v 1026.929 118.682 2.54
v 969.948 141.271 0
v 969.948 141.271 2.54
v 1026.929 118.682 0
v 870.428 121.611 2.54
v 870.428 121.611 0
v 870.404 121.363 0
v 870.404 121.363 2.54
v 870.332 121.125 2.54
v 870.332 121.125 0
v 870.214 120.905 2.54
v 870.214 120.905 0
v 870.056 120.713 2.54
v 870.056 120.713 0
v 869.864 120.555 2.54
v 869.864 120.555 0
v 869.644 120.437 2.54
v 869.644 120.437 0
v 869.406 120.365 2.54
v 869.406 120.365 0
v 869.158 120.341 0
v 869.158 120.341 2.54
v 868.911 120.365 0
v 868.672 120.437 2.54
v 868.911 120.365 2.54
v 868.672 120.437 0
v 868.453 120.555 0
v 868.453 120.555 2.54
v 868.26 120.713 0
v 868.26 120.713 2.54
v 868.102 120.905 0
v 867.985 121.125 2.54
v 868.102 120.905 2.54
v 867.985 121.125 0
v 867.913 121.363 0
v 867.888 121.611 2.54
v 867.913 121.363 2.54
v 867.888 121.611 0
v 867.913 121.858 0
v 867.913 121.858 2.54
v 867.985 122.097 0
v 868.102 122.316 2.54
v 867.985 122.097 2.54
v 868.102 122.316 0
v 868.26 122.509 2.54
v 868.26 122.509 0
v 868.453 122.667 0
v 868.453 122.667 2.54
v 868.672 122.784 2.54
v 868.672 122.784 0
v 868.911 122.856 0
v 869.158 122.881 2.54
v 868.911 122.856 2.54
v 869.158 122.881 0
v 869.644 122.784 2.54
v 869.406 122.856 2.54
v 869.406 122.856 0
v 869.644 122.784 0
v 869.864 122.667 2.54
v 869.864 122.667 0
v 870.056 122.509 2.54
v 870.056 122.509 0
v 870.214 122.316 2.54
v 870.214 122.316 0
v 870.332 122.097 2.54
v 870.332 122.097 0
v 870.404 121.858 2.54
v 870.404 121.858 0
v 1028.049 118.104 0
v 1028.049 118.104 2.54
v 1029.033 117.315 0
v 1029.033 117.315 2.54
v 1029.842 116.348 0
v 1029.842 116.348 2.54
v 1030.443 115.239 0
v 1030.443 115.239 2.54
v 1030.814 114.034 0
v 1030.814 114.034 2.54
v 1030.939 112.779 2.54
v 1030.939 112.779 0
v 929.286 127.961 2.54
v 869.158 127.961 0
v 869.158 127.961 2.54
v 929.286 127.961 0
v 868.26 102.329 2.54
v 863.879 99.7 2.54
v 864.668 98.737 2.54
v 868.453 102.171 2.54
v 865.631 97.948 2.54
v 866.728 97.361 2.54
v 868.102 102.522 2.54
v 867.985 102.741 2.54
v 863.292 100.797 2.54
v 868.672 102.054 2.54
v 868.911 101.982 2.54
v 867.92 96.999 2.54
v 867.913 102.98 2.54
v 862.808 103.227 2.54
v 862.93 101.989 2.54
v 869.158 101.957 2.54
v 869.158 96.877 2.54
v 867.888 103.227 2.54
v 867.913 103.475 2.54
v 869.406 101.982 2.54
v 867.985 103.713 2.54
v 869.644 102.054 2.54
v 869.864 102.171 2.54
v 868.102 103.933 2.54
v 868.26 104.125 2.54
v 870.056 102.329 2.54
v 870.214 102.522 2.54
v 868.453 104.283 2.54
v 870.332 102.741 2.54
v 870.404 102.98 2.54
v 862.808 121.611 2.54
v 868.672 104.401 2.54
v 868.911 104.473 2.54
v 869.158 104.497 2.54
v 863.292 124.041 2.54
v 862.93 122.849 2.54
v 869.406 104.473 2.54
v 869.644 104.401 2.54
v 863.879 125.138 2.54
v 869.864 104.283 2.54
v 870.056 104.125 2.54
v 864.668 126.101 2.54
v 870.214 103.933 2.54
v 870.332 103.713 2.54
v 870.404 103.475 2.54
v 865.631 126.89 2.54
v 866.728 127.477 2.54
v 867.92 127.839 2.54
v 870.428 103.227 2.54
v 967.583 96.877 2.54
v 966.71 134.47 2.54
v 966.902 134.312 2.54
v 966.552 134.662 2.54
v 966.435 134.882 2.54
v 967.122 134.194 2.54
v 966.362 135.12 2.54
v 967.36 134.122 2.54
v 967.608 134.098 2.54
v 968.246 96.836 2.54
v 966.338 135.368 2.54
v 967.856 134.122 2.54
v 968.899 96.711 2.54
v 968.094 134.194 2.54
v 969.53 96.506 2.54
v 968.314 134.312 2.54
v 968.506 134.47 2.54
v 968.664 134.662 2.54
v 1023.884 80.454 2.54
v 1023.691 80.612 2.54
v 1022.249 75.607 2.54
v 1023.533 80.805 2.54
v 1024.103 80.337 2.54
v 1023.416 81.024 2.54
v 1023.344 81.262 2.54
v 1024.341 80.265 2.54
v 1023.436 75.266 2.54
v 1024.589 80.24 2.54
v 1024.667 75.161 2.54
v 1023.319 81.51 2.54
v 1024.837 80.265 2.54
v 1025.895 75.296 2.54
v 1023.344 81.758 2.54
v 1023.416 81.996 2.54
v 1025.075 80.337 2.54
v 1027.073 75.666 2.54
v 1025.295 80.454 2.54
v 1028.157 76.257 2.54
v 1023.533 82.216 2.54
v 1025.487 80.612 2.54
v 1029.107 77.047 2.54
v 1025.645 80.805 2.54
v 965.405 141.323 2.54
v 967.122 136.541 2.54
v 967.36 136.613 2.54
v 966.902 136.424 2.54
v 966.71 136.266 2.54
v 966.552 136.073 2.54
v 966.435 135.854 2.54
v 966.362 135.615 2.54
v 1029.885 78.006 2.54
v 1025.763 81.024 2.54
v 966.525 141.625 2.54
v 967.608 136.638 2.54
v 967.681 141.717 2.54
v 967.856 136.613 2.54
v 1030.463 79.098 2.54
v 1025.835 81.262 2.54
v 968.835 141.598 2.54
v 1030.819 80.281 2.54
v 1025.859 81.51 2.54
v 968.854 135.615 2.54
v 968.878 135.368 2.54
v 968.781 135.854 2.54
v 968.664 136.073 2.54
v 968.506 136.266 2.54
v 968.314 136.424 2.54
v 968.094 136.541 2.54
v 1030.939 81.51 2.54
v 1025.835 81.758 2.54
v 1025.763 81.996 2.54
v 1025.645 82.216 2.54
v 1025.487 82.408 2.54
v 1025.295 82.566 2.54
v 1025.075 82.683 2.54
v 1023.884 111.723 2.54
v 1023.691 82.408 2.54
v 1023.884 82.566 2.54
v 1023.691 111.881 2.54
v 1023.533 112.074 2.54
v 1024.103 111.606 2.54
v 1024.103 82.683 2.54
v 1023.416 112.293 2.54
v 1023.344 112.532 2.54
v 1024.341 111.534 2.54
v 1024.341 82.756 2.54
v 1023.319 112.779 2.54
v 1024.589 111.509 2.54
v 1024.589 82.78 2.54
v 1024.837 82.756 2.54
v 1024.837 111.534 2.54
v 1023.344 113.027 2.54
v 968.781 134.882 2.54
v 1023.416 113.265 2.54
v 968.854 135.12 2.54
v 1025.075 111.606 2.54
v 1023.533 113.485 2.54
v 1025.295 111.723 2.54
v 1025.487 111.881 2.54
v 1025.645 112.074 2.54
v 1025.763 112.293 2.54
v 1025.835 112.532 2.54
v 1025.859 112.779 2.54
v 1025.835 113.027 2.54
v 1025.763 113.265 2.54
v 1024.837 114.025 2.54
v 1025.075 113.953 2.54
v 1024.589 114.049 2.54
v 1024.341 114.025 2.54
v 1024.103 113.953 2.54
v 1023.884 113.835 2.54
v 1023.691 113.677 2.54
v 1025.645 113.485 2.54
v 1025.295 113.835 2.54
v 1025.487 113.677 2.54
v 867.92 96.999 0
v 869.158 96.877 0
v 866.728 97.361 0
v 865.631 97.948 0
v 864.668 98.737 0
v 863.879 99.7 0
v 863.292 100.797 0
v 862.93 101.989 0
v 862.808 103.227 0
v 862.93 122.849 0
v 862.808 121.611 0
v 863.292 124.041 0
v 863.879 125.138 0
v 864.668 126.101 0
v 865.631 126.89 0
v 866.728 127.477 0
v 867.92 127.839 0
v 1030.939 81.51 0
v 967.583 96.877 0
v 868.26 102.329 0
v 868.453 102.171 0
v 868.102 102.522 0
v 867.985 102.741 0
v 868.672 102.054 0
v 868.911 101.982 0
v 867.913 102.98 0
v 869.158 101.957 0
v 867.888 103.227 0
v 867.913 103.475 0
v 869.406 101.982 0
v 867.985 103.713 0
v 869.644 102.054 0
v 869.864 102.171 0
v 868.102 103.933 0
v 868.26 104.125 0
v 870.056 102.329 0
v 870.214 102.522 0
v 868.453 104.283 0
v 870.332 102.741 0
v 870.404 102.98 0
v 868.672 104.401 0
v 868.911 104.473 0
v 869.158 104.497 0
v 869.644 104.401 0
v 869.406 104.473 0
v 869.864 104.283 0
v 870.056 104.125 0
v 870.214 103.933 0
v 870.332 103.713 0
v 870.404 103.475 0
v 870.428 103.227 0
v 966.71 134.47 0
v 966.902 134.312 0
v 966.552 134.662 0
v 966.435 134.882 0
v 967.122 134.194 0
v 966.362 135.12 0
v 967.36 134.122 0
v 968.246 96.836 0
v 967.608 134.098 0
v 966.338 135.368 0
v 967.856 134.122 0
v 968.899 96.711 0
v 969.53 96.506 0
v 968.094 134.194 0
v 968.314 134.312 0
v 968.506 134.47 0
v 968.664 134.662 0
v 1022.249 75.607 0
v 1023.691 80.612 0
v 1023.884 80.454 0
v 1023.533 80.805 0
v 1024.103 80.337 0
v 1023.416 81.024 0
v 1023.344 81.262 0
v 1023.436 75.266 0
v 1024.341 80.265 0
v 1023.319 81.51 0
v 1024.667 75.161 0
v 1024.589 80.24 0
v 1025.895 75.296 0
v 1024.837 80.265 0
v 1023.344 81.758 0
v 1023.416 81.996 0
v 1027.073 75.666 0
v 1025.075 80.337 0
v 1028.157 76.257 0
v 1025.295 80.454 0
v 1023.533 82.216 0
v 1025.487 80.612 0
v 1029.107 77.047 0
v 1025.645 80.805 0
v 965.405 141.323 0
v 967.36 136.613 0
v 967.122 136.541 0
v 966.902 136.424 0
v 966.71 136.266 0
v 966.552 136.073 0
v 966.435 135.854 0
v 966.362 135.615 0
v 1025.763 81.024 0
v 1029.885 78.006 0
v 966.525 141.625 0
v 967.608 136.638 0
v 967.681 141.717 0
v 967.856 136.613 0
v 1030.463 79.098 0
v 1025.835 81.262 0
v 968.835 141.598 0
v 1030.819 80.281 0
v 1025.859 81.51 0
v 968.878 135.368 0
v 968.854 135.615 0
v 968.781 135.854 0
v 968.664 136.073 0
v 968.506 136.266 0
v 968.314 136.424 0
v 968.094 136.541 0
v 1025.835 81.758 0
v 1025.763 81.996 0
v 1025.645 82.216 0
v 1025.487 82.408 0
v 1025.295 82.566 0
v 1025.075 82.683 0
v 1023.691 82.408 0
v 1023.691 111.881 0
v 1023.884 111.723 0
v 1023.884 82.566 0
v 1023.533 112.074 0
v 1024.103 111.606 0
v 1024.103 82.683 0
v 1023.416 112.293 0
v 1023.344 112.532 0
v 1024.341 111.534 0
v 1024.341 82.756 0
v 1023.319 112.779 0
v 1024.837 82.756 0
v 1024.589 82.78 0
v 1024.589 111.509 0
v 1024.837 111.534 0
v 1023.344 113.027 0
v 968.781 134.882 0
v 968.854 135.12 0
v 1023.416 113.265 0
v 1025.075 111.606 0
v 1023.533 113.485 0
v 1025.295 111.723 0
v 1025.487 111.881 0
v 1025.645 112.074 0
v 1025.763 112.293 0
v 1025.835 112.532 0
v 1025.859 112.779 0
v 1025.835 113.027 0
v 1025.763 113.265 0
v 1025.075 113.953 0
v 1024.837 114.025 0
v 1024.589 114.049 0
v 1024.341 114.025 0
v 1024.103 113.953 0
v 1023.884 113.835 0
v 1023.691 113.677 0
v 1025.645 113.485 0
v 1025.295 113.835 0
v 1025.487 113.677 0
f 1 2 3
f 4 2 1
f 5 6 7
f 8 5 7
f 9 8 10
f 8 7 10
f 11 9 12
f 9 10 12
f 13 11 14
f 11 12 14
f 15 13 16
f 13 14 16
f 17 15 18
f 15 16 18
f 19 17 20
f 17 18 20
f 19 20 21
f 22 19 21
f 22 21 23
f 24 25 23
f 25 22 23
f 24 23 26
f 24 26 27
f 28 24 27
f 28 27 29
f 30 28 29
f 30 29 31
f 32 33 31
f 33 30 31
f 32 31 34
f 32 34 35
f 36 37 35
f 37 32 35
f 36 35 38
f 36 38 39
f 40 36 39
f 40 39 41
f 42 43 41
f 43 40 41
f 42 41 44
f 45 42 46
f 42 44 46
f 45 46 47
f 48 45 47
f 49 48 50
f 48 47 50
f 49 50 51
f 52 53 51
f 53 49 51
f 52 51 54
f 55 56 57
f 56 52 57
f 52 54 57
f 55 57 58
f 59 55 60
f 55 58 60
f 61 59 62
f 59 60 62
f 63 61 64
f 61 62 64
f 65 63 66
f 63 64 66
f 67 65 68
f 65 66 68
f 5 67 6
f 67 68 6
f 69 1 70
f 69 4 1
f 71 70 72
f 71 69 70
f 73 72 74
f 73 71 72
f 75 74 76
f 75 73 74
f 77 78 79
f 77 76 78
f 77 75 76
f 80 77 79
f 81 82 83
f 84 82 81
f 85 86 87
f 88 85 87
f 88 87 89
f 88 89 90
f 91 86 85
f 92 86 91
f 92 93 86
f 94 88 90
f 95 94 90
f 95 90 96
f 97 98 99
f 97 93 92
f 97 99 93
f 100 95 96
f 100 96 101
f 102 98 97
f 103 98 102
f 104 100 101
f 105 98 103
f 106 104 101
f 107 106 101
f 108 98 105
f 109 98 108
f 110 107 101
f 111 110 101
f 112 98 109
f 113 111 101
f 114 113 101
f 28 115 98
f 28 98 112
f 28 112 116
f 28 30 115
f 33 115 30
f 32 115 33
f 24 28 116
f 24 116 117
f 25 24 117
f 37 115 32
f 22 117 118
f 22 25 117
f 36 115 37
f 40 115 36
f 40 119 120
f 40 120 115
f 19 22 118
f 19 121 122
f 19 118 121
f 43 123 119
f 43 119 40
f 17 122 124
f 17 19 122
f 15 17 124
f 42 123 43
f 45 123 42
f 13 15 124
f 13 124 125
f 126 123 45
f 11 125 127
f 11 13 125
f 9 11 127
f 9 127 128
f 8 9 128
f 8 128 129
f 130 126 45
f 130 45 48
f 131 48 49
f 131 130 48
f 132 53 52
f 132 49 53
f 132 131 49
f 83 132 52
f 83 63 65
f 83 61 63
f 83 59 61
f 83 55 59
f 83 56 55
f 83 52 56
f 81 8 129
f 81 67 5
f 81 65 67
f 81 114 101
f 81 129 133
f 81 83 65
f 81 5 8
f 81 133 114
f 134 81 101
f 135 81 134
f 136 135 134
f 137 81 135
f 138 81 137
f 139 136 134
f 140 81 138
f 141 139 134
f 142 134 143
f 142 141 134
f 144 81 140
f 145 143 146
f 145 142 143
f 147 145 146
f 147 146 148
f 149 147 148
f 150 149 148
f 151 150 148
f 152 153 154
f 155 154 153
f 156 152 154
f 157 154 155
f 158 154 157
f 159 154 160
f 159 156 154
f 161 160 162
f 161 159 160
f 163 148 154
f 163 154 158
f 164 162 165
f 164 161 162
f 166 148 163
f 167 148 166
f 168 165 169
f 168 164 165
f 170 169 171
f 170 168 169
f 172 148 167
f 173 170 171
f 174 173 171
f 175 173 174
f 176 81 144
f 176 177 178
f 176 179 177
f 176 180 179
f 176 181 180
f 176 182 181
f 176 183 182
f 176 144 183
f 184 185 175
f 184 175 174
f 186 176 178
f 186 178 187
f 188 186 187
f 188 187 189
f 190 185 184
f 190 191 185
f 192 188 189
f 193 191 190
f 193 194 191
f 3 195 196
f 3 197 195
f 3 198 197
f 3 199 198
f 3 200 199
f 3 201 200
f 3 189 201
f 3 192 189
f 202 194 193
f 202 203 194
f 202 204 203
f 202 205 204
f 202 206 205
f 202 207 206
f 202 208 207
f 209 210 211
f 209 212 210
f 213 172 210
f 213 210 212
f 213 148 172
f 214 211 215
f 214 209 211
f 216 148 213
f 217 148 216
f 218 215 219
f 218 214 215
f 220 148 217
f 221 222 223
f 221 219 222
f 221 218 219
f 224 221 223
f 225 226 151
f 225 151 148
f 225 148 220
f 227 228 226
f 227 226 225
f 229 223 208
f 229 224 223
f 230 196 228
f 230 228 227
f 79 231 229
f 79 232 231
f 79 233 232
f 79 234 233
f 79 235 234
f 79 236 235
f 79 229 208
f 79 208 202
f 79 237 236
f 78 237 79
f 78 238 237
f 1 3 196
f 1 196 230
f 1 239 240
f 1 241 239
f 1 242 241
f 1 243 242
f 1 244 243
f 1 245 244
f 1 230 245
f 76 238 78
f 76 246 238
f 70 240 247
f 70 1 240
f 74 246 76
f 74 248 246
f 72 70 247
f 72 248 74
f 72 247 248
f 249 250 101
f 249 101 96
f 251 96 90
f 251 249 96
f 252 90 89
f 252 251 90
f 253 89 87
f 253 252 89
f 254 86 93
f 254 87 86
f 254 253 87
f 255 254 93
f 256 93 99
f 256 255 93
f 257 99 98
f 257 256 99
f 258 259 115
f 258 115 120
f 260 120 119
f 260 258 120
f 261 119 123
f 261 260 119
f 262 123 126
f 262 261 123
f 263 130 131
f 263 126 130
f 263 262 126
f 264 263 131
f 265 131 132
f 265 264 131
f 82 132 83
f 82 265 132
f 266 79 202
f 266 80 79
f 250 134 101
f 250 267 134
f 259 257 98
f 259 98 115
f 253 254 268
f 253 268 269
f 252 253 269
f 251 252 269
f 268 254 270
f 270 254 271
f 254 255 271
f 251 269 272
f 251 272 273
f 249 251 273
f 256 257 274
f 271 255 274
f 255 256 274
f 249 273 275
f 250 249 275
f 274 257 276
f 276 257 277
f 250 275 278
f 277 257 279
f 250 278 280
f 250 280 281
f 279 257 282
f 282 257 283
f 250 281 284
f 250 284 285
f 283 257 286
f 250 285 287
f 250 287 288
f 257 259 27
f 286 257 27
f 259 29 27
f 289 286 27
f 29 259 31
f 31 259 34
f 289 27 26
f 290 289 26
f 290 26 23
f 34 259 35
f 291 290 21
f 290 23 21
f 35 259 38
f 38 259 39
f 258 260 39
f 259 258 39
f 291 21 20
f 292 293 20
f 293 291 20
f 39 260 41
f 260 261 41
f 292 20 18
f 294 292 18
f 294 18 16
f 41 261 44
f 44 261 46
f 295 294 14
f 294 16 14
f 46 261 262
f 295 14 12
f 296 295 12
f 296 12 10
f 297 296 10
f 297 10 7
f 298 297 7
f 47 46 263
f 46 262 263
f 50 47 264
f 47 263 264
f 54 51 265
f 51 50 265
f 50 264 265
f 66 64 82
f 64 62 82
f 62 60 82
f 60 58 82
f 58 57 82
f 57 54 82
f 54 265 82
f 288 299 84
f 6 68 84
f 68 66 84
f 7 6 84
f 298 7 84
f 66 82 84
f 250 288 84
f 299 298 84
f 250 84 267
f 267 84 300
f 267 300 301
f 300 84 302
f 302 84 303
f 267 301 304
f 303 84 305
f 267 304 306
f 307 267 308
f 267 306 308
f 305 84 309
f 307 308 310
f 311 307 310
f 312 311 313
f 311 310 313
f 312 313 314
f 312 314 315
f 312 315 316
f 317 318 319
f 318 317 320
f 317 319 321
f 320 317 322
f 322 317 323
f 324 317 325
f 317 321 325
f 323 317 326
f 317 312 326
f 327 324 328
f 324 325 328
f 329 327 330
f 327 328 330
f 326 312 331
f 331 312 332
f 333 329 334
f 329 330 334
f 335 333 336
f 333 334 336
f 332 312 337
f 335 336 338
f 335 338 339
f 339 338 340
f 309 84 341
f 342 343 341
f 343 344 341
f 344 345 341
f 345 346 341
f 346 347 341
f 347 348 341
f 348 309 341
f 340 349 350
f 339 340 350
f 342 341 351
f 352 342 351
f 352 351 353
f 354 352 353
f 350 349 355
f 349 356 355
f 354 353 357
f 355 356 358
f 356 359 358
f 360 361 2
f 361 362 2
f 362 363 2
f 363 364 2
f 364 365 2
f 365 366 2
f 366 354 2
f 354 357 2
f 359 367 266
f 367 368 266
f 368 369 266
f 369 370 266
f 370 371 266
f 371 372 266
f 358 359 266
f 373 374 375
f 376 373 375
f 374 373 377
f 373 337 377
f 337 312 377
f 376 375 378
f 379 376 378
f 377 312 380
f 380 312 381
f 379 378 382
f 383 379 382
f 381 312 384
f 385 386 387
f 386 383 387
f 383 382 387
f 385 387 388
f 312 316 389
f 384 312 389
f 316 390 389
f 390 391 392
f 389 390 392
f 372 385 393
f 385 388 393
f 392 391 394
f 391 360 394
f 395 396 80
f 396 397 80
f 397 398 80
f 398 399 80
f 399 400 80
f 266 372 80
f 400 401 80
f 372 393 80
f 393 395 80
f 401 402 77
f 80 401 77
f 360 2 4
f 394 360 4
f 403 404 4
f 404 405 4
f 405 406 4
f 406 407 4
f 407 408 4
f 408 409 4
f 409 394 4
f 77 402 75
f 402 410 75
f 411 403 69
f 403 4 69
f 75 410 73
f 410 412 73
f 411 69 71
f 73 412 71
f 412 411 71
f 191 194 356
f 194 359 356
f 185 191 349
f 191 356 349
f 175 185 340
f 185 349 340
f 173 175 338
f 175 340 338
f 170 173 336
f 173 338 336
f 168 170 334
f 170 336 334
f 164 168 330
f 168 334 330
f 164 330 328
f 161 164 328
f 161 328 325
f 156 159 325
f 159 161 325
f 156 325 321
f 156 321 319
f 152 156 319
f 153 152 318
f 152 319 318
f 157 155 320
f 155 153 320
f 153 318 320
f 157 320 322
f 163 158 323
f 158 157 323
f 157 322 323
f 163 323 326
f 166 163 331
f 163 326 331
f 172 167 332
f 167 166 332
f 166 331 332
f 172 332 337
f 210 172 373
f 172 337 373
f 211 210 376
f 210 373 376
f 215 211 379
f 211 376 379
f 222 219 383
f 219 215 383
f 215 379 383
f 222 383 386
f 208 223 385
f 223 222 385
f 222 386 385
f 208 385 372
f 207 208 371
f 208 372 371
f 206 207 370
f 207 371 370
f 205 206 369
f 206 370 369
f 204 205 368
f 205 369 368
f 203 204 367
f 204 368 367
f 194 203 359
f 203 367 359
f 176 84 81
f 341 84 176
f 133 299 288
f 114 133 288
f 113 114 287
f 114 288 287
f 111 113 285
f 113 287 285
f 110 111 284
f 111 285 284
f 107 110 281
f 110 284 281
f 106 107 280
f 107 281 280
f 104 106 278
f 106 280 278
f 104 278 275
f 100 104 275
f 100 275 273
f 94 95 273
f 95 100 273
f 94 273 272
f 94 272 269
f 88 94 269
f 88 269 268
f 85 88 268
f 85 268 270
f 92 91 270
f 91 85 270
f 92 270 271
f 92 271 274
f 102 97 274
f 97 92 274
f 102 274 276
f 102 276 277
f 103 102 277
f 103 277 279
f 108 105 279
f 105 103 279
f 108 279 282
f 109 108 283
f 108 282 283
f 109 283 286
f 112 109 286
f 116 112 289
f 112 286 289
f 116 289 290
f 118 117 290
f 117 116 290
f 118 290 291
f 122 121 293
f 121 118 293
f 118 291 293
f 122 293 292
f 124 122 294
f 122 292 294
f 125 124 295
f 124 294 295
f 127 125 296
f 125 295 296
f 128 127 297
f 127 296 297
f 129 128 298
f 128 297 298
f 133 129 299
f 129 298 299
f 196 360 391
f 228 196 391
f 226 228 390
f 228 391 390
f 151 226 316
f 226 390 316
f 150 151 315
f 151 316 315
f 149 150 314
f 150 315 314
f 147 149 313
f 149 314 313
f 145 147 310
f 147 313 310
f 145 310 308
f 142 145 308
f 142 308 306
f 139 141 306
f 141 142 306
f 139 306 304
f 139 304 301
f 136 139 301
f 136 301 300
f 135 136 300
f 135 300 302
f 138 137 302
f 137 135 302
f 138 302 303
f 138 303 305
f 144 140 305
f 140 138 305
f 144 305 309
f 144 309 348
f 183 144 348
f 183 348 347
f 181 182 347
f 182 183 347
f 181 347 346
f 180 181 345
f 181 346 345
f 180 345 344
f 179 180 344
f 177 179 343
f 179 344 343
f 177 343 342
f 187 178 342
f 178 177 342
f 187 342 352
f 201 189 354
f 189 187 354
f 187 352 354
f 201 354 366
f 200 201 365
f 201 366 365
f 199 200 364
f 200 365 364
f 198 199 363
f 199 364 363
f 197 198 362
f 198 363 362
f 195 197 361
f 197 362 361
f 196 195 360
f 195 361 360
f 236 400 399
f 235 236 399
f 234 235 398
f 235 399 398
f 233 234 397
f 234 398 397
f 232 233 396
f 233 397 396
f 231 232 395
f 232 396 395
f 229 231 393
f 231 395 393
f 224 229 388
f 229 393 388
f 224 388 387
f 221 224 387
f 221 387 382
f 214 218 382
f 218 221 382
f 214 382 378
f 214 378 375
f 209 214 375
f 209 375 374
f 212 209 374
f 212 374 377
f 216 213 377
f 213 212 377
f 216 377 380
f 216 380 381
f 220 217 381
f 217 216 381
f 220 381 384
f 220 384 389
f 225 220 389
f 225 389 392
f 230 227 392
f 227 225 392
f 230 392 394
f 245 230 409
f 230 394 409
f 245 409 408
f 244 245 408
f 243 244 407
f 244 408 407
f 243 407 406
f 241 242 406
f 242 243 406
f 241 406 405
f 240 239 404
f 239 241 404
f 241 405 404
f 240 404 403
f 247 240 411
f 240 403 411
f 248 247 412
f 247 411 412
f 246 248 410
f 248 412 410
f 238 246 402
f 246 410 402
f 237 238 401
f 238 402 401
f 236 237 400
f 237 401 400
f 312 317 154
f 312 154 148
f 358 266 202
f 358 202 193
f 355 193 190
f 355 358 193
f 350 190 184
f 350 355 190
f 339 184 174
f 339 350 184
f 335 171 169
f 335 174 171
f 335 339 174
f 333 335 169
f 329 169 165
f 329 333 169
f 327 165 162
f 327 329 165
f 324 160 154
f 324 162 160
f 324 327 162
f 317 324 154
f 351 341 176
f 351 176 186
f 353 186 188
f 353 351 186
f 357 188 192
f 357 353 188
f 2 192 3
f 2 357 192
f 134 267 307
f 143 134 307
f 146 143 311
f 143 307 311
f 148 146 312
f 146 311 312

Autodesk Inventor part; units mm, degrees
ref_plane "YZ Plane" through (0, 0, 0) normal (1, 0, 0) x (0, 1, 0)
ref_plane "XZ Plane" through (0, 0, 0) normal (0, 1, 0) x (-1, 0, 0)
ref_plane "XY Plane" through (0, 0, 0) normal (0, 0, 1) x (1, 0, 0)
sketch "Profile" plane through (0, 0, 0) normal (0, 0, 1) x (1, 0, 0)
  circle A0 centre (1024.5892, 81.5101) radius 1.27
  circle A1 centre (869.1584, 103.2274) radius 1.27
  circle A2 centre (869.1584, 121.6106) radius 1.27
  circle A3 centre (967.608, 135.3677) radius 1.27
  circle A4 centre (1024.5892, 112.7794) radius 1.27
  line L0 (963.5286, 137.2438) -> (964.6303, 134.266)
  arc A5 (964.6303, 134.266) -> (970.5595, 134.1976) centre (967.608, 135.3677) ccw
  line L1 (970.5595, 134.1976) -> (971.7296, 137.1492)
  line L2 (1022.8077, 116.901) -> (971.7296, 137.1492)
  line L3 (1022.8077, 116.901) -> (1021.6376, 113.9494)
  arc A6 (1021.6376, 113.9494) -> (1024.5892, 109.6044) centre (1024.5892, 112.7794) ccw
  line L4 (1024.5892, 109.6044) -> (1027.7642, 109.6044)
  line L5 (1027.7642, 84.6851) -> (1027.7642, 109.6044)
  line L6 (1027.7642, 84.6851) -> (1024.5892, 84.6851)
  arc A7 (1024.5892, 84.6851) -> (1021.6376, 82.6802) centre (1024.5892, 81.5101) ccw
  line L7 (1021.6376, 82.6802) -> (1020.4676, 79.7286)
  line L8 (970.7004, 99.4571) -> (1020.4676, 79.7286)
  arc A8 (970.7004, 99.4571) -> (967.5834, 100.0524) centre (967.5834, 91.5942) ccw
  line L9 (872.3334, 100.0524) -> (967.5834, 100.0524)
  line L10 (872.3334, 100.0524) -> (872.3334, 103.2274)
  arc A9 (872.3334, 103.2274) -> (869.1584, 106.4024) centre (869.1584, 103.2274) ccw
  line L11 (869.1584, 106.4024) -> (865.9834, 106.4024)
  line L12 (865.9834, 118.4356) -> (865.9834, 106.4024)
  line L13 (865.9834, 118.4356) -> (869.1584, 118.4356)
  arc A10 (869.1584, 118.4356) -> (872.3334, 121.6106) centre (869.1584, 121.6106) ccw
  line L14 (872.3334, 121.6106) -> (872.3334, 124.7856)
  line L15 (929.2861, 124.7856) -> (872.3334, 124.7856)
  arc A11 (929.2861, 124.7856) -> (930.3878, 124.9829) centre (929.2861, 127.9606) ccw
  line L16 (963.5286, 137.2438) -> (930.3878, 124.9829)
  line L17 (869.1584, 127.9606) -> (929.2861, 127.9606)
  arc A12 (869.1584, 127.9606) -> (862.8084, 121.6106) centre (869.1584, 121.6106) ccw
  line L18 (862.8084, 103.2274) -> (862.8084, 121.6106)
  arc A13 (862.8084, 103.2274) -> (869.1584, 96.8774) centre (869.1584, 103.2274) ccw
  line L19 (967.5834, 96.8774) -> (869.1584, 96.8774)
  arc A14 (969.5304, 96.5056) -> (967.5834, 96.8774) centre (967.5834, 91.5942) ccw
  line L20 (1022.2491, 75.607) -> (969.5304, 96.5056)
  arc A15 (1022.2491, 75.607) -> (1030.9392, 81.5101) centre (1024.5892, 81.5101) ccw
  line L21 (1030.9392, 112.7794) -> (1030.9392, 81.5101)
  arc A16 (1030.9392, 112.7794) -> (1026.9292, 118.6825) centre (1024.5892, 112.7794) ccw
  line L22 (969.9481, 141.2708) -> (1026.9292, 118.6825)
  arc A17 (969.9481, 141.2708) -> (965.4047, 141.3232) centre (967.608, 135.3677) ccw
  line L23 (929.2861, 127.9606) -> (965.4047, 141.3232)
  point P0 (0, 0)
extrude "ProfileFeature" add sketch "Profile" along normal blind 2.54 contours L0 A5 L1 L2 L3 A6 L4 L5 L6 A7 L7 L8 A8 L9 L10 A9 L11 L12 L13 A10 L14 L15 A11 L16 | L17 L23 A17 L22 A16 L21 A15 L20 A14 L19 A13 L18 A12
properties part number "switchback-secondary-cover"
